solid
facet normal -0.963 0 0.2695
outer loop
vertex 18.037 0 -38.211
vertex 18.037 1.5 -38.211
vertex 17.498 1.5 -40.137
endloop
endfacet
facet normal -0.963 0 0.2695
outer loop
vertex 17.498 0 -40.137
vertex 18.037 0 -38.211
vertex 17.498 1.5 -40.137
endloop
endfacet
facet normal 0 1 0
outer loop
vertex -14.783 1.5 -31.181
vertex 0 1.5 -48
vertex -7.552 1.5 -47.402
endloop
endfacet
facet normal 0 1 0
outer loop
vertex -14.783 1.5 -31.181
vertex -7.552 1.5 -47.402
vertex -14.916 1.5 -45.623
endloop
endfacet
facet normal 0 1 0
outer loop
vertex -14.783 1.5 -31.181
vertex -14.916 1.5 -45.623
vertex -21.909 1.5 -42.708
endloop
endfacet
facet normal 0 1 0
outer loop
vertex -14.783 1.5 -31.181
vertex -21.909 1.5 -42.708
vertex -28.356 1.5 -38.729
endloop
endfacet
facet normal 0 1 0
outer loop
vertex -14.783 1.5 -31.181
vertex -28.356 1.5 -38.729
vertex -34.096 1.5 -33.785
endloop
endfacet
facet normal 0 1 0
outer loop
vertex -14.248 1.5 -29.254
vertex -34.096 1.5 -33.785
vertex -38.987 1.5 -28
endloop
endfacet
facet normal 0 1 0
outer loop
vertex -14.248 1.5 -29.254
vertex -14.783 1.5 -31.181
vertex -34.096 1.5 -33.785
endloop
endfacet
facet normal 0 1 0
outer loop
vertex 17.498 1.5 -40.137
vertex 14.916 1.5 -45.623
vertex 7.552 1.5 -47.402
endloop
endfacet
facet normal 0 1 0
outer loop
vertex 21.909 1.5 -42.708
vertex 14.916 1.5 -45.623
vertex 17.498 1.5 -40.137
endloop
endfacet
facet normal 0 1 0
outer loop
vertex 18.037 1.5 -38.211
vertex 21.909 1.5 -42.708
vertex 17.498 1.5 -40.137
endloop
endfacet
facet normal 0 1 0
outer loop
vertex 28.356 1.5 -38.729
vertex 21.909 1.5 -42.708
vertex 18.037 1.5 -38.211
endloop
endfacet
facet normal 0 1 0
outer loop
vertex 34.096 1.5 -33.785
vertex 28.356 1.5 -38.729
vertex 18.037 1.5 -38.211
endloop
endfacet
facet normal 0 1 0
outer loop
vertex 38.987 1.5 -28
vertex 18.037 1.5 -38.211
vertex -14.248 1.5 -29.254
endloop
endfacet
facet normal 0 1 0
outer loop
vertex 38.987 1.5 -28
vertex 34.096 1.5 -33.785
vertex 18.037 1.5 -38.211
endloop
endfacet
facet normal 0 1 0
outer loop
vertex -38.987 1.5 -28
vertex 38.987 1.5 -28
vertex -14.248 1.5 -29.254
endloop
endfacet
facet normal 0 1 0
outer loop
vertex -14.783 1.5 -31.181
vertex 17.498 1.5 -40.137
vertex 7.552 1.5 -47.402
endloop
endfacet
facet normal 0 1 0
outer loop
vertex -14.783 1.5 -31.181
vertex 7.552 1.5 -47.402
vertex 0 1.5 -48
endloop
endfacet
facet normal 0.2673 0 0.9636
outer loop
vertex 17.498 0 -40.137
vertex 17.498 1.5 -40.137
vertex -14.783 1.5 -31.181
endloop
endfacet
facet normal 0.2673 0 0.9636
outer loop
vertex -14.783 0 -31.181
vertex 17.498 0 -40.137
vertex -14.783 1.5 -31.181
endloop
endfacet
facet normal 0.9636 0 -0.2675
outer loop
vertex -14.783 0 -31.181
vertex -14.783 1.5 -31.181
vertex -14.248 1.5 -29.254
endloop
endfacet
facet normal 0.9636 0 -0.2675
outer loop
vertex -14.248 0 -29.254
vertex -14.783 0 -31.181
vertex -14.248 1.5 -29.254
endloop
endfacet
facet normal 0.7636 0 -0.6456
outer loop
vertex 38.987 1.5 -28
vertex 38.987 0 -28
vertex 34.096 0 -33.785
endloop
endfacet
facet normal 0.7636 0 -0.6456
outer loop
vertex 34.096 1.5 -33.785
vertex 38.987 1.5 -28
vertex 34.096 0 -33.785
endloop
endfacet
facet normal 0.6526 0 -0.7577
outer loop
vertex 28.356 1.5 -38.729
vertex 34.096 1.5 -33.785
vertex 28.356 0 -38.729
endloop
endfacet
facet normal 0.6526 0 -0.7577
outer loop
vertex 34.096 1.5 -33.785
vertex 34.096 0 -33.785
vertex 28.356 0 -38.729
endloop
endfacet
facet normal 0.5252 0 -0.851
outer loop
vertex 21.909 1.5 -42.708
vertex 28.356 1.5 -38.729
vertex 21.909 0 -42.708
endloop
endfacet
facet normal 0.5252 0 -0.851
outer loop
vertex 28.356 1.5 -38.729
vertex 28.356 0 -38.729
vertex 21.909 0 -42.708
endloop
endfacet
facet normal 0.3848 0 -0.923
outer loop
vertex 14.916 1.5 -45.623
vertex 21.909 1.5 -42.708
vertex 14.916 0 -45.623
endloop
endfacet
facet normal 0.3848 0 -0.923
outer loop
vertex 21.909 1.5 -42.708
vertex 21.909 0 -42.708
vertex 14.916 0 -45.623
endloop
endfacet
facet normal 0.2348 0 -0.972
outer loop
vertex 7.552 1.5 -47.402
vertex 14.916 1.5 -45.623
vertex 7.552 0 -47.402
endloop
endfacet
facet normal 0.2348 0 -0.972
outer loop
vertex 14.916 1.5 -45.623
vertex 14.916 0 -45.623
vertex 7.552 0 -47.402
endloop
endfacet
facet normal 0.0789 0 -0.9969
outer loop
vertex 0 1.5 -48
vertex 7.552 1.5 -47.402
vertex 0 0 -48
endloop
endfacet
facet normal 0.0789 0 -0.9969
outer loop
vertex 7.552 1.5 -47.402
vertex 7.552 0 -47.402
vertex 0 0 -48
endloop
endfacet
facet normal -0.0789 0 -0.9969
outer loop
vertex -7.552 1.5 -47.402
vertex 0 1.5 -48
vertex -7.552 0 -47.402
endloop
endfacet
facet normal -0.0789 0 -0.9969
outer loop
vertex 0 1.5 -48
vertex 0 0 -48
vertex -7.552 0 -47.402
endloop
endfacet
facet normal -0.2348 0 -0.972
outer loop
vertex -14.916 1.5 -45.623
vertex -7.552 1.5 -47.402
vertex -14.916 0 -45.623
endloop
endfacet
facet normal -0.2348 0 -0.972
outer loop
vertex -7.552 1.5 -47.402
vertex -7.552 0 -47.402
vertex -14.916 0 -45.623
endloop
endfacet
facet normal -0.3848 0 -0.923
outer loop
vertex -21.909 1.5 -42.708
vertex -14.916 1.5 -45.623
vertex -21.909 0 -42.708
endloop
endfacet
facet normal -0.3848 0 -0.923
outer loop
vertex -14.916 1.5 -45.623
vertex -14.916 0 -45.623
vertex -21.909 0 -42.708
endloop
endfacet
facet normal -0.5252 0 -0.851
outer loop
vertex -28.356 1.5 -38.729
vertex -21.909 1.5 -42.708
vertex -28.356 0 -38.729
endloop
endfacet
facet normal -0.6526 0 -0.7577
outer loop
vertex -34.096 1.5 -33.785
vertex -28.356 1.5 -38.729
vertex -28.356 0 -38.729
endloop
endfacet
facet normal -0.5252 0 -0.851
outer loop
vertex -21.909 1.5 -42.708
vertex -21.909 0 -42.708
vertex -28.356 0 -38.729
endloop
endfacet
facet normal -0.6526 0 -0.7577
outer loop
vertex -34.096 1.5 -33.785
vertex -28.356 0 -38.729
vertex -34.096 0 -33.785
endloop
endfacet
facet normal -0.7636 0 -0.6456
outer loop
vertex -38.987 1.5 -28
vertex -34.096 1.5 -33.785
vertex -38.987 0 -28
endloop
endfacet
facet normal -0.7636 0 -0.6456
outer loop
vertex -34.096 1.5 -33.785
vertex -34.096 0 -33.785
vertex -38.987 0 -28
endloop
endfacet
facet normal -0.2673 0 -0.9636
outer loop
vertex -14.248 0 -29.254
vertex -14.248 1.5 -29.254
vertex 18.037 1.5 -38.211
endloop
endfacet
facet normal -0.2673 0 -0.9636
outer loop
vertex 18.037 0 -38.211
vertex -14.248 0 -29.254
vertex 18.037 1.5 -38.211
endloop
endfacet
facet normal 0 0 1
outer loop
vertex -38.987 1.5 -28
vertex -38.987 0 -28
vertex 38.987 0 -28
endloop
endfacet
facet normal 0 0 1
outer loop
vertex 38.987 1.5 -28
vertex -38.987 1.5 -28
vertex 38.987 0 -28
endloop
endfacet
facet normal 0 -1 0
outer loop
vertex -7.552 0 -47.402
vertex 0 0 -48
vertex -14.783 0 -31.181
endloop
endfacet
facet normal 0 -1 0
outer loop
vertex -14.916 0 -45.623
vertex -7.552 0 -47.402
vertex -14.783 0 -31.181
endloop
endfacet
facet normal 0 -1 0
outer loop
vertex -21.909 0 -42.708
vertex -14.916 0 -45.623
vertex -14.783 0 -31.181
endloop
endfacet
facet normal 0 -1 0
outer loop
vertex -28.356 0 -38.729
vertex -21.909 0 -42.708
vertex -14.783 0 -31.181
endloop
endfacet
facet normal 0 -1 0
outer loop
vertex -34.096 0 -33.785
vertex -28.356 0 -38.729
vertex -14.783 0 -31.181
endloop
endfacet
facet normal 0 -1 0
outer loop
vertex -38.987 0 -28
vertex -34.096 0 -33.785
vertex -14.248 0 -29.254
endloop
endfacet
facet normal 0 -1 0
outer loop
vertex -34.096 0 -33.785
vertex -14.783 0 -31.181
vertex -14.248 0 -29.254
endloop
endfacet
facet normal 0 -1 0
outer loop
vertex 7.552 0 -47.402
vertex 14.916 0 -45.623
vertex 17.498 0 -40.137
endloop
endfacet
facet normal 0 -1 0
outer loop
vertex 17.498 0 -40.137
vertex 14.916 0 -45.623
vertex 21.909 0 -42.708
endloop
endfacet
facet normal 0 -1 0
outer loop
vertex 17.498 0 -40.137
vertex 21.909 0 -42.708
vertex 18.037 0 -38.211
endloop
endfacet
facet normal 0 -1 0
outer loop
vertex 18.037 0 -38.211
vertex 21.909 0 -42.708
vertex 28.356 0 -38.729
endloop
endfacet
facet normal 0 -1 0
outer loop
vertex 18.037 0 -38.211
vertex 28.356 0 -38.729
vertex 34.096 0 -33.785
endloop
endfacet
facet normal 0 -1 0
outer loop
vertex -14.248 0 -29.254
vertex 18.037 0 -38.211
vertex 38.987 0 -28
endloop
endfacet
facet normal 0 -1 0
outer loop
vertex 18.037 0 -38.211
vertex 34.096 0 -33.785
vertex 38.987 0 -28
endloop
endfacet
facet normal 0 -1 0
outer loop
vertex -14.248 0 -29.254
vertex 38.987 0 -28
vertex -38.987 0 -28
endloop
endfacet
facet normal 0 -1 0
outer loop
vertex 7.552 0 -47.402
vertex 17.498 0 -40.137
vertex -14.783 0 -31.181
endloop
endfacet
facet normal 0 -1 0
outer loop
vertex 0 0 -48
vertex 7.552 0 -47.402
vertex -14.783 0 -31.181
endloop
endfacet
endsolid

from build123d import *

# Parameters (mm, degrees)
SKETCH1_R           = 48
BOSS_EXTRUDE1_DEPTH = 1.5
CUT_EXTRUDE1_START  = -1.5
CUT_EXTRUDE1_DEPTH  = 1.5
CUT_EXTRUDE2_DEPTH  = 1.5


with BuildPart() as part:
    # Sketch1 → Boss-Extrude1 (new body)
    with BuildSketch(Plane(origin=(0, 0, 0), x_dir=(1, 0, 0), z_dir=(0, 1, 0))):
        with Locations(Location((0, 0, 0), (0, 0, 270))):
            Circle(SKETCH1_R)
    extrude(amount=BOSS_EXTRUDE1_DEPTH)

    # Sketch2 → Cut-Extrude1 (cut)
    with BuildSketch(Plane(origin=(0, 1.5, 0), x_dir=(1, 0, 0), z_dir=(0, 1, 0)).offset(CUT_EXTRUDE1_START)):
        with BuildLine():
            Line((-38.987177379, 28), (38.987177379, 28))
            ThreePointArc((38.987177379, 28), (0, -48), (-38.987177379, 28))
        make_face()
    extrude(amount=CUT_EXTRUDE1_DEPTH, mode=Mode.SUBTRACT)

    # Sketch3 → Cut-Extrude2 (cut)
    with BuildSketch(Plane(origin=(0, 1.5, 0), x_dir=(1, 0, 0), z_dir=(0, 1, 0))):
        Polygon((17.498096782, 40.137165991), (-14.782501595, 31.180996698), (-14.24780465, 29.253796759), (18.036697969, 38.211053647), align=None)
    extrude(amount=-CUT_EXTRUDE2_DEPTH, mode=Mode.SUBTRACT)


solid = part.part
